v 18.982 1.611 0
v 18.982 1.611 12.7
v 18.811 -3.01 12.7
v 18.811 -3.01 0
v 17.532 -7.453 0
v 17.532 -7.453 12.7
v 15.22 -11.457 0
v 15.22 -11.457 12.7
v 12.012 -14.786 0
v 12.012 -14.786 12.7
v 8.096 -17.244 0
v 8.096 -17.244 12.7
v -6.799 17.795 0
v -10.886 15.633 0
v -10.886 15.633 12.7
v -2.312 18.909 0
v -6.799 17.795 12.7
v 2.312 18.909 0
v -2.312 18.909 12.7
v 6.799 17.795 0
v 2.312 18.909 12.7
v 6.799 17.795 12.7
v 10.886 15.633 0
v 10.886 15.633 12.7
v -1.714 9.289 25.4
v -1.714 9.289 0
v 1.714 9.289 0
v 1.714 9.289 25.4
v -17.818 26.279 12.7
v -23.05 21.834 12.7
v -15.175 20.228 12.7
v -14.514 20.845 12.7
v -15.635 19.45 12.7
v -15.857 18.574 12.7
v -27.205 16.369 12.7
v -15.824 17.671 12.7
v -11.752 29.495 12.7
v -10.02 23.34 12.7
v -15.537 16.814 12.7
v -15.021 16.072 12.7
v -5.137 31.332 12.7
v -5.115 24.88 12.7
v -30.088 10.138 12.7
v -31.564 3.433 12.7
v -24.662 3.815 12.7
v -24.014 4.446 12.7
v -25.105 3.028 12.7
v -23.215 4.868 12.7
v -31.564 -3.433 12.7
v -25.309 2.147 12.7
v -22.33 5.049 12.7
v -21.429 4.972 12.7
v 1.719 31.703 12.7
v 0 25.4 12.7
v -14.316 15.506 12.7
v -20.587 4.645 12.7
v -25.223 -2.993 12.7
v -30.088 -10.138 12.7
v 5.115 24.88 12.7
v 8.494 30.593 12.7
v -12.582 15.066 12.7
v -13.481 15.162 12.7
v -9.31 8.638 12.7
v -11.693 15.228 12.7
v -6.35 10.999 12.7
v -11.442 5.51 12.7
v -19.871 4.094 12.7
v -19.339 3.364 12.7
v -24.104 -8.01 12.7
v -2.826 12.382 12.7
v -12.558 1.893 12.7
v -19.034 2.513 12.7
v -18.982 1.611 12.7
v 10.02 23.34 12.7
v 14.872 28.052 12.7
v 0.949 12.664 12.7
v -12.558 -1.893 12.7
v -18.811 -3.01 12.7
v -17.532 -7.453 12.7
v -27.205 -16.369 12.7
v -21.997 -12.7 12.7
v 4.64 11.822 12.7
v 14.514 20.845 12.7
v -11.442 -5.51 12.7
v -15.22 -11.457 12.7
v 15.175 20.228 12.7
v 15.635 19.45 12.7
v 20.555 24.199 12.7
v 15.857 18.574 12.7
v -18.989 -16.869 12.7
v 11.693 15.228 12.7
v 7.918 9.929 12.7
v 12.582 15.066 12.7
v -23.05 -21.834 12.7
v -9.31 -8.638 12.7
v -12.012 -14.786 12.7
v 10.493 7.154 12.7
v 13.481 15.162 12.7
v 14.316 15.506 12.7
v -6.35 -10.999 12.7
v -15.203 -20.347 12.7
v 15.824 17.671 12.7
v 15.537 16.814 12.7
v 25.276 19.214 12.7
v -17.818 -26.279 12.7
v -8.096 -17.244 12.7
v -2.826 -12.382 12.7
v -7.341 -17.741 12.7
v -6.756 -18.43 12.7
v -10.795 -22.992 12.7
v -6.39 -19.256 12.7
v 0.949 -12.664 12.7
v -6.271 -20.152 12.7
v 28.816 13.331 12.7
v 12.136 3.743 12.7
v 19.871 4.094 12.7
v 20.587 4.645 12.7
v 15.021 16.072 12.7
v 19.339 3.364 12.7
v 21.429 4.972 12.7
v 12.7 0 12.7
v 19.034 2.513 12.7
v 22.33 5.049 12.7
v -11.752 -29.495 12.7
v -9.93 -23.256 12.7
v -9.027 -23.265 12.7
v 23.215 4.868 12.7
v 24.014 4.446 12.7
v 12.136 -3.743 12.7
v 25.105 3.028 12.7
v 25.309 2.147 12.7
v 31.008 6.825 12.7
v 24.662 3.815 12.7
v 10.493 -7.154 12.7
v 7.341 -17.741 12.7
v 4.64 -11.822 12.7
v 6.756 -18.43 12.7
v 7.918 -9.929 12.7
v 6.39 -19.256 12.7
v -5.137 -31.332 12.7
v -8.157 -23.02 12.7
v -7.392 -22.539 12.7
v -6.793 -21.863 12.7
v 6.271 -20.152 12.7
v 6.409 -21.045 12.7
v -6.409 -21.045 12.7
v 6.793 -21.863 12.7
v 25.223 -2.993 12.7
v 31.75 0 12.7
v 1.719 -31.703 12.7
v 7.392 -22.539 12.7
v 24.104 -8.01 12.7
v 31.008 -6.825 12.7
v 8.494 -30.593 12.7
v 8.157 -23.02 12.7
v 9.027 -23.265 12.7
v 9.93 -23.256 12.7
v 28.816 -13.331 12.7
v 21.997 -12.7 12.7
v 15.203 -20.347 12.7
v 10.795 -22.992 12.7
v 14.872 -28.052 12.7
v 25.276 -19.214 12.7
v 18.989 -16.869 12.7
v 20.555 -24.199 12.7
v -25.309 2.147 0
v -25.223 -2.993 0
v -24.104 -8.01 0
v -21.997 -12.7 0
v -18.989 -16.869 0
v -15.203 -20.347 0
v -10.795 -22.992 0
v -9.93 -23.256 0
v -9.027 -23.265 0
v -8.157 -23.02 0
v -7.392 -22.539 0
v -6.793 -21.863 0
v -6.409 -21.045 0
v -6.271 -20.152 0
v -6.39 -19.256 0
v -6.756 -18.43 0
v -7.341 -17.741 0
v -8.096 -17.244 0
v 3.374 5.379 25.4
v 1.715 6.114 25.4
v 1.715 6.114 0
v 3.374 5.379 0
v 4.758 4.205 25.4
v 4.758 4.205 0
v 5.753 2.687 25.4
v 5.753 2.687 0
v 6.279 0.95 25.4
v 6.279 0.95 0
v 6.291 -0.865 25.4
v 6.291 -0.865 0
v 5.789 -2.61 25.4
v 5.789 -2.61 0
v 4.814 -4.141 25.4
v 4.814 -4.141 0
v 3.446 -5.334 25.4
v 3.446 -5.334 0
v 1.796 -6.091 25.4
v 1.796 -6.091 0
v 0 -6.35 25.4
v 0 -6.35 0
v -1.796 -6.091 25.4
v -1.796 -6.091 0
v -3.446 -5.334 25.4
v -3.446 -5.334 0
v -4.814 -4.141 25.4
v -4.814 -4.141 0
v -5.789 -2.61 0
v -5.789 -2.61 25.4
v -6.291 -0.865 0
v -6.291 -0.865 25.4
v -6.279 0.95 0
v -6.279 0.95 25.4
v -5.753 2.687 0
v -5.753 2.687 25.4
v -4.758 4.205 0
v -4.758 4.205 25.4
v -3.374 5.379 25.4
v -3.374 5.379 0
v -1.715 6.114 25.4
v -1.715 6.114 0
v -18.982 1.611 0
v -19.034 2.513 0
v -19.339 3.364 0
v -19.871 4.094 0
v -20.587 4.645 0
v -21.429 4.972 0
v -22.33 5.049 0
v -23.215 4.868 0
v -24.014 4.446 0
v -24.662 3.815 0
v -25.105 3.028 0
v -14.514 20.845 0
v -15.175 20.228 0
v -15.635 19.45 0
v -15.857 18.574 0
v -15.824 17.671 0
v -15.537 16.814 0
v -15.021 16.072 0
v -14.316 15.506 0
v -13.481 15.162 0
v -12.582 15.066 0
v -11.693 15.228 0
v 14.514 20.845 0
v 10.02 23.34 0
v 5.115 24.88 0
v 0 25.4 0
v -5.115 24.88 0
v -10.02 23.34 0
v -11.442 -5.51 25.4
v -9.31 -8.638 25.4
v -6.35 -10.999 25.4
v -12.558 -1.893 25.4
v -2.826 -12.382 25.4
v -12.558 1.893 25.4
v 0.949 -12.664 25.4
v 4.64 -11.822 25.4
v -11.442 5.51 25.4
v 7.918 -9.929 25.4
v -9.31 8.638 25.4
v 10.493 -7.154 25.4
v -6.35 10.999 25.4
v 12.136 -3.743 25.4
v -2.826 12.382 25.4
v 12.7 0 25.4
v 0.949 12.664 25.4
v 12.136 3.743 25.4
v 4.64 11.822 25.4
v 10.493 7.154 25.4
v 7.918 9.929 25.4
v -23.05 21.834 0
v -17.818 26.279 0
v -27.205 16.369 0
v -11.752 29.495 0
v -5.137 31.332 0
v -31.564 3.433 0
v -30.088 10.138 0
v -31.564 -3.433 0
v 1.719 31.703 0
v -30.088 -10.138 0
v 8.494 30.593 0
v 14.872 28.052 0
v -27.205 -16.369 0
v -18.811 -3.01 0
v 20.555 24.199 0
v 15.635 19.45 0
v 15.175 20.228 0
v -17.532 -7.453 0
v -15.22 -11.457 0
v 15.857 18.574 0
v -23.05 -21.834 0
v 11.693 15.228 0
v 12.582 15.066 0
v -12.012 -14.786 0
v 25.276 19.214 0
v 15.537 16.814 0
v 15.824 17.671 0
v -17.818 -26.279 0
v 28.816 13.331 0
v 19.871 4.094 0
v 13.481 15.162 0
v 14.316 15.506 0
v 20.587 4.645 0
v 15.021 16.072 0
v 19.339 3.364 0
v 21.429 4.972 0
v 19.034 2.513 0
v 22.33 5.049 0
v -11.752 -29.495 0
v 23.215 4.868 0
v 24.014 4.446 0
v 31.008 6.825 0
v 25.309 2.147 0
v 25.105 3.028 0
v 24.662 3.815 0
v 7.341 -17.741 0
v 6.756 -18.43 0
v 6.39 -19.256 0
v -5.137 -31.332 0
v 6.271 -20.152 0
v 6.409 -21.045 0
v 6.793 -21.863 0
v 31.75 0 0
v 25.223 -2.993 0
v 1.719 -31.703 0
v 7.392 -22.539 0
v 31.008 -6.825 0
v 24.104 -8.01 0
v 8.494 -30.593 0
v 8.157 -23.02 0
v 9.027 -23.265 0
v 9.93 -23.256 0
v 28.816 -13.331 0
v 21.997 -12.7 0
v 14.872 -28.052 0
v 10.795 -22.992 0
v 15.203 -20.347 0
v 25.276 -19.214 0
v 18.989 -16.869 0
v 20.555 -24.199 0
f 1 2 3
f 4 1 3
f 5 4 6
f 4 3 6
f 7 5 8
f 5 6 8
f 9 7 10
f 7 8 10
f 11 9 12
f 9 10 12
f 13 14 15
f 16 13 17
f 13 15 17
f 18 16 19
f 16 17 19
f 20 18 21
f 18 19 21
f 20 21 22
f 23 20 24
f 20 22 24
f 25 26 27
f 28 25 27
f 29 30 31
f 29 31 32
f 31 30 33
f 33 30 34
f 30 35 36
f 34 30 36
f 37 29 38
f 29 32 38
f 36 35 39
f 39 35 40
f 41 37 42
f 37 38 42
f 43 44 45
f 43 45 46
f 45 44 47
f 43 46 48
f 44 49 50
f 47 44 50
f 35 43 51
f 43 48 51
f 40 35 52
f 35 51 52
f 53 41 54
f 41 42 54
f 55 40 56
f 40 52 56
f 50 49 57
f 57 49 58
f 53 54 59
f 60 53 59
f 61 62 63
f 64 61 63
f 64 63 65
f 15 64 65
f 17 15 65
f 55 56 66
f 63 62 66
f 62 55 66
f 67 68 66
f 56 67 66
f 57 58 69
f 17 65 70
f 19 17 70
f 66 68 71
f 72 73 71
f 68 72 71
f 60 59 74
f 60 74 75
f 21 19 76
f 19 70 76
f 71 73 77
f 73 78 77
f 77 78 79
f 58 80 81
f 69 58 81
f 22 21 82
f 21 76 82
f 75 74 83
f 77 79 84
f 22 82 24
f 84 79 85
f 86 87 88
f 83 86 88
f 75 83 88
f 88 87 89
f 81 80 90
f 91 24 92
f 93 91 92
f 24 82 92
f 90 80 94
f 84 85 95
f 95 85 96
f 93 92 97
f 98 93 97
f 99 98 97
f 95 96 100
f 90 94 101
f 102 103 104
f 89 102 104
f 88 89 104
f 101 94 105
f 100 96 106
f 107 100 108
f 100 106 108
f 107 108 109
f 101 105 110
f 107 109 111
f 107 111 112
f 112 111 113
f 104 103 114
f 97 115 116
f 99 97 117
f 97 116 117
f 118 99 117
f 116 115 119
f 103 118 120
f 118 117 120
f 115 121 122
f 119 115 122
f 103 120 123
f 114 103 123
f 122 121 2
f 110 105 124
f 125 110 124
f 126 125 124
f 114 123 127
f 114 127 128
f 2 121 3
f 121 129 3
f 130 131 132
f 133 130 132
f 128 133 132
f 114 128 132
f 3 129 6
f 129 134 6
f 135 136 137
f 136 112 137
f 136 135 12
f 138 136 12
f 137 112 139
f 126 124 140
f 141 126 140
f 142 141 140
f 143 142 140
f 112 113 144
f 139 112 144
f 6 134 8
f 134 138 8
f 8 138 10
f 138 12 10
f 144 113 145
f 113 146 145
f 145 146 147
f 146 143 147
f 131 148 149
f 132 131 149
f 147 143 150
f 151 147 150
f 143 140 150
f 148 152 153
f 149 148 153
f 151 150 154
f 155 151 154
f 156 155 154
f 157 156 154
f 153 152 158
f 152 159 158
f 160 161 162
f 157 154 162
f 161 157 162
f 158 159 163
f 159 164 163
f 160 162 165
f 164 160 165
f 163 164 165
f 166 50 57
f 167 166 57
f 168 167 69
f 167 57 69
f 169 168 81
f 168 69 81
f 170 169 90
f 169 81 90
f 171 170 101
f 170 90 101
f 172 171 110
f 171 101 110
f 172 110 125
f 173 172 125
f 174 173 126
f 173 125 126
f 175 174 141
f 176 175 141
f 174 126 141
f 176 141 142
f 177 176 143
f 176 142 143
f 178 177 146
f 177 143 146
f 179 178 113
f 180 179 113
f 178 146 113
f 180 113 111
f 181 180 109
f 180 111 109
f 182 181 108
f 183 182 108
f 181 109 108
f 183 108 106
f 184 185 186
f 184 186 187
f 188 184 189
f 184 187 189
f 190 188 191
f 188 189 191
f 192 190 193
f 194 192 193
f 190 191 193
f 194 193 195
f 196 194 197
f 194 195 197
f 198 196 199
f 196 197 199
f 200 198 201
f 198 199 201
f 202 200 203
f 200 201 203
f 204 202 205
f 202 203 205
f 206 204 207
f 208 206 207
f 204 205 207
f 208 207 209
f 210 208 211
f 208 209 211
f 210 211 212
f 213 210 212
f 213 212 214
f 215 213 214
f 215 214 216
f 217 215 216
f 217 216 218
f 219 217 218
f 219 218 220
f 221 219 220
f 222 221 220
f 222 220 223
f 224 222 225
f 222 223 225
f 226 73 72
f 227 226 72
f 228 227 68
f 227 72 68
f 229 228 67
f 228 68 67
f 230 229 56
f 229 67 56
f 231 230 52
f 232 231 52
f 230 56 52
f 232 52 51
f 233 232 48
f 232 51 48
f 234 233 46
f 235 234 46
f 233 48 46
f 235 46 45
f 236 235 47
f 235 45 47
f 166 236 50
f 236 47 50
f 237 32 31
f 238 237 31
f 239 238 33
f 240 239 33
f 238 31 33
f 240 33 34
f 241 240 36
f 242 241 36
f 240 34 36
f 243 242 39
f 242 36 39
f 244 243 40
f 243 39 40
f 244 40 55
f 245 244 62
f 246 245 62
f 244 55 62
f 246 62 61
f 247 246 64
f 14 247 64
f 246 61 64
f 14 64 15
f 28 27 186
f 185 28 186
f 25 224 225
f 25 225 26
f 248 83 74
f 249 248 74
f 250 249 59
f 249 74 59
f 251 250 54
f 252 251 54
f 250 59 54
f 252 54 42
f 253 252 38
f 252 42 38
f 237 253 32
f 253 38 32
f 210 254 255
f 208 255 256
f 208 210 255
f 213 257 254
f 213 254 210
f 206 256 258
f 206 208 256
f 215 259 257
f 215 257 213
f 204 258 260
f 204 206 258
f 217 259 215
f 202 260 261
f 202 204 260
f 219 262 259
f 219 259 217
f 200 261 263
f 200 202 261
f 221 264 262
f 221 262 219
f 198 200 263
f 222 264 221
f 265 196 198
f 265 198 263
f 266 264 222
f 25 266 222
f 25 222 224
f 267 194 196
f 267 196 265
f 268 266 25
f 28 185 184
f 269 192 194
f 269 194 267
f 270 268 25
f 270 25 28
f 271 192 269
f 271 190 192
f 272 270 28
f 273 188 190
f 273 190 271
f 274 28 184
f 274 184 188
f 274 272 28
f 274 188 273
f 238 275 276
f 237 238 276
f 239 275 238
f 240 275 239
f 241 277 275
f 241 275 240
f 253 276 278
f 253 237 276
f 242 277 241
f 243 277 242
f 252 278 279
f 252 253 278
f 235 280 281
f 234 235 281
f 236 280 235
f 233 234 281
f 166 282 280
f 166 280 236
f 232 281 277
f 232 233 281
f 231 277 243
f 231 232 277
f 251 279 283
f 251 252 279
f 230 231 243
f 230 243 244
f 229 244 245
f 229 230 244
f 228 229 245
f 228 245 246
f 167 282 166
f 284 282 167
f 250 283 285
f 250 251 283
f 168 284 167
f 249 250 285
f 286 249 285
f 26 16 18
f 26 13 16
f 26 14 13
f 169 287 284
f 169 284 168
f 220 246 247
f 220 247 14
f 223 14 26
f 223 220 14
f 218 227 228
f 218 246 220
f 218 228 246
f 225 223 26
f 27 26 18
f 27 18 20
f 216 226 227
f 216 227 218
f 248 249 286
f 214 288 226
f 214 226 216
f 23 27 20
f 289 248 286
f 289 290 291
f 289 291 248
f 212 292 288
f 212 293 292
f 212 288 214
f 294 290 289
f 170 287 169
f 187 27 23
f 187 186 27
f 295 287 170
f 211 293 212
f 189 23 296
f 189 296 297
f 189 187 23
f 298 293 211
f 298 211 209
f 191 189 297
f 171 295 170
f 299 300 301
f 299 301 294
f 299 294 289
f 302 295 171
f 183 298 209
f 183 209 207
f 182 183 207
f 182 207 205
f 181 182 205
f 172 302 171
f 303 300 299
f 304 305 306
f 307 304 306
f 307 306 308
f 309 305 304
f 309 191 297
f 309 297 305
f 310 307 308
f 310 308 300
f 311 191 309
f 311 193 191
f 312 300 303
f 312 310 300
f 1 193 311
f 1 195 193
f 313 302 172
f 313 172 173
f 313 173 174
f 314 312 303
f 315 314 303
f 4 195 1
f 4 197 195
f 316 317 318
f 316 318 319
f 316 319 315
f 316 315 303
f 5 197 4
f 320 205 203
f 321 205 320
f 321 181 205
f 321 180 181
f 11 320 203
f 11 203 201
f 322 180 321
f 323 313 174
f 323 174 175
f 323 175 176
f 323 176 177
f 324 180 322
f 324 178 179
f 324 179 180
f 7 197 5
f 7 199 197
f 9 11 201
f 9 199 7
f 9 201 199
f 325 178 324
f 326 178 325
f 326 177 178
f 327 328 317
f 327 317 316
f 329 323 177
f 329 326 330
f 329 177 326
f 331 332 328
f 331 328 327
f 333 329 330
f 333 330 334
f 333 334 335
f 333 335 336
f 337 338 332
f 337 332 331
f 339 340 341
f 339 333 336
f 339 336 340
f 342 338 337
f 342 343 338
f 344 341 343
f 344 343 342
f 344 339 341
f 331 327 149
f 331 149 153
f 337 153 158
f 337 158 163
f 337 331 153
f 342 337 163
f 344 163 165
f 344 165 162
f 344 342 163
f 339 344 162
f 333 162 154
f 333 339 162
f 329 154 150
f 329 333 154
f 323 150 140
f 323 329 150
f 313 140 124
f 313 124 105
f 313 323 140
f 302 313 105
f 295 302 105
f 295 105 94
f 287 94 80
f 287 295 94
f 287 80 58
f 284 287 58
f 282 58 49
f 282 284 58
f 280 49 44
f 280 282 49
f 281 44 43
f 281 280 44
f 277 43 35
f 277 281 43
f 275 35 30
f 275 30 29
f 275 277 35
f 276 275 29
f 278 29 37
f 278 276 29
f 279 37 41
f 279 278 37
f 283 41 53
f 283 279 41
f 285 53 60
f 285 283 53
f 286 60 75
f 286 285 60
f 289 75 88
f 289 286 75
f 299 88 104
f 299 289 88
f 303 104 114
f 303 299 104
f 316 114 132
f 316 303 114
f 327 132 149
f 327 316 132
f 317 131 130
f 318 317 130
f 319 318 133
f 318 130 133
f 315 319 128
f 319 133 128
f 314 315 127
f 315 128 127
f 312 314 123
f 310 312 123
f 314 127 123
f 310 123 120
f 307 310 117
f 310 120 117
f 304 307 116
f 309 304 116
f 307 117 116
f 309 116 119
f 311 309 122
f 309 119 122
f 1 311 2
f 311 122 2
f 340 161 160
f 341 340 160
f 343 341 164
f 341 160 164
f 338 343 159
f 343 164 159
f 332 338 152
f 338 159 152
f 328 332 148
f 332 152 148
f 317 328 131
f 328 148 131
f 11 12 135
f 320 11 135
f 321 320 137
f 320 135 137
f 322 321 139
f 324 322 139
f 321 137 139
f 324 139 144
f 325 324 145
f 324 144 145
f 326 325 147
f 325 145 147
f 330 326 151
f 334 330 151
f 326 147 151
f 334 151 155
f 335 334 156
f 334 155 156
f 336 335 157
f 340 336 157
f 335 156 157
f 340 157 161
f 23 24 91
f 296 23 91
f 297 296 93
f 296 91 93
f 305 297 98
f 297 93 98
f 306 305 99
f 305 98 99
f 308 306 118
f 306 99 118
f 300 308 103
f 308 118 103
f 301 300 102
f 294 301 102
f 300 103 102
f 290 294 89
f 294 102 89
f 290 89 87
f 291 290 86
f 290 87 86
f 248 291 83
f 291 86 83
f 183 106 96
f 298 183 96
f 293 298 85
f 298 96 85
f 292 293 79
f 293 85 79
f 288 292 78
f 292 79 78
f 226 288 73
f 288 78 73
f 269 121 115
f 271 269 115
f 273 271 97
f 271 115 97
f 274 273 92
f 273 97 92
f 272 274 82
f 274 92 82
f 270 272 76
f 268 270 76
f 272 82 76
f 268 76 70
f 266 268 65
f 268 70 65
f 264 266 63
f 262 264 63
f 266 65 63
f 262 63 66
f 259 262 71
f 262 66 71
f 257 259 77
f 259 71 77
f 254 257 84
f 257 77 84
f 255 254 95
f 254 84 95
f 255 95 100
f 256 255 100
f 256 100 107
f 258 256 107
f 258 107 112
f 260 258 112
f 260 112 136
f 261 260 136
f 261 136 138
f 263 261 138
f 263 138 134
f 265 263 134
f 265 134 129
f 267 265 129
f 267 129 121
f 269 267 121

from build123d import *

# Parameters (mm, degrees)
F0_R     = 12.7
F1_DEPTH = 25.4
F2_R     = 31.75
F2_R_2   = 12.7
F3_DEPTH = 12.7
F5_DEPTH = 25.4


with BuildPart() as f1:
    # F0 (on Top) → F1 (new body)
    with BuildSketch(Plane.XY):
        Circle(F0_R)
        with BuildLine():
            ThreePointArc((1.7145, 6.114163), (0, -6.35), (-1.7145, 6.114163))
            Line((-1.7145, 6.114163), (-1.7145, 9.289163))
            Line((-1.7145, 9.289163), (1.7145, 9.289163))
            Line((1.7145, 9.289163), (1.7145, 6.114163))
        make_face(mode=Mode.SUBTRACT)
    extrude(amount=F1_DEPTH)

    # F2 (on face) → F3 (join)
    with BuildSketch(Plane(origin=(0, 0, 0), x_dir=(1, 0, 0), z_dir=(0, 0, -1))):
        Circle(F2_R)
        Circle(F2_R_2, mode=Mode.SUBTRACT)
    extrude(amount=-F3_DEPTH)

    # F4 (on face) → F5 (cut)
    with BuildSketch(Plane.XY.offset(12.7)):
        with BuildLine():
            ThreePointArc((-14.514286, 20.844556), (-15.305569, 16.424701), (-10.885714, 15.633417))
            ThreePointArc((-10.885714, 15.633417), (0, 19.05), (10.885714, 15.633417))
            ThreePointArc((10.885714, 15.633417), (15.305569, 16.424701), (14.514286, 20.844556))
            ThreePointArc((14.514286, 20.844556), (0, 25.4), (-14.514286, 20.844556))
        make_face()
        with BuildLine():
            ThreePointArc((-10.794772, -22.992018), (-6.571423, -21.467362), (-8.096079, -17.244014))
            ThreePointArc((-8.096079, -17.244014), (-16.497784, -9.525), (-18.981793, 1.610597))
            ThreePointArc((-18.981793, 1.610597), (-21.876993, 5.042662), (-25.309058, 2.147462))
            ThreePointArc((-25.309058, 2.147462), (-21.997045, -12.7), (-10.794772, -22.992018))
        make_face()
        with BuildLine():
            ThreePointArc((25.309058, 2.147462), (21.876993, 5.042662), (18.981793, 1.610597))
            ThreePointArc((18.981793, 1.610597), (16.497784, -9.525), (8.096079, -17.244014))
            ThreePointArc((8.096079, -17.244014), (6.571423, -21.467362), (10.794772, -22.992018))
            ThreePointArc((10.794772, -22.992018), (21.997045, -12.7), (25.309058, 2.147462))
        make_face()
    extrude(amount=-F5_DEPTH, mode=Mode.SUBTRACT)


solid = f1.part
